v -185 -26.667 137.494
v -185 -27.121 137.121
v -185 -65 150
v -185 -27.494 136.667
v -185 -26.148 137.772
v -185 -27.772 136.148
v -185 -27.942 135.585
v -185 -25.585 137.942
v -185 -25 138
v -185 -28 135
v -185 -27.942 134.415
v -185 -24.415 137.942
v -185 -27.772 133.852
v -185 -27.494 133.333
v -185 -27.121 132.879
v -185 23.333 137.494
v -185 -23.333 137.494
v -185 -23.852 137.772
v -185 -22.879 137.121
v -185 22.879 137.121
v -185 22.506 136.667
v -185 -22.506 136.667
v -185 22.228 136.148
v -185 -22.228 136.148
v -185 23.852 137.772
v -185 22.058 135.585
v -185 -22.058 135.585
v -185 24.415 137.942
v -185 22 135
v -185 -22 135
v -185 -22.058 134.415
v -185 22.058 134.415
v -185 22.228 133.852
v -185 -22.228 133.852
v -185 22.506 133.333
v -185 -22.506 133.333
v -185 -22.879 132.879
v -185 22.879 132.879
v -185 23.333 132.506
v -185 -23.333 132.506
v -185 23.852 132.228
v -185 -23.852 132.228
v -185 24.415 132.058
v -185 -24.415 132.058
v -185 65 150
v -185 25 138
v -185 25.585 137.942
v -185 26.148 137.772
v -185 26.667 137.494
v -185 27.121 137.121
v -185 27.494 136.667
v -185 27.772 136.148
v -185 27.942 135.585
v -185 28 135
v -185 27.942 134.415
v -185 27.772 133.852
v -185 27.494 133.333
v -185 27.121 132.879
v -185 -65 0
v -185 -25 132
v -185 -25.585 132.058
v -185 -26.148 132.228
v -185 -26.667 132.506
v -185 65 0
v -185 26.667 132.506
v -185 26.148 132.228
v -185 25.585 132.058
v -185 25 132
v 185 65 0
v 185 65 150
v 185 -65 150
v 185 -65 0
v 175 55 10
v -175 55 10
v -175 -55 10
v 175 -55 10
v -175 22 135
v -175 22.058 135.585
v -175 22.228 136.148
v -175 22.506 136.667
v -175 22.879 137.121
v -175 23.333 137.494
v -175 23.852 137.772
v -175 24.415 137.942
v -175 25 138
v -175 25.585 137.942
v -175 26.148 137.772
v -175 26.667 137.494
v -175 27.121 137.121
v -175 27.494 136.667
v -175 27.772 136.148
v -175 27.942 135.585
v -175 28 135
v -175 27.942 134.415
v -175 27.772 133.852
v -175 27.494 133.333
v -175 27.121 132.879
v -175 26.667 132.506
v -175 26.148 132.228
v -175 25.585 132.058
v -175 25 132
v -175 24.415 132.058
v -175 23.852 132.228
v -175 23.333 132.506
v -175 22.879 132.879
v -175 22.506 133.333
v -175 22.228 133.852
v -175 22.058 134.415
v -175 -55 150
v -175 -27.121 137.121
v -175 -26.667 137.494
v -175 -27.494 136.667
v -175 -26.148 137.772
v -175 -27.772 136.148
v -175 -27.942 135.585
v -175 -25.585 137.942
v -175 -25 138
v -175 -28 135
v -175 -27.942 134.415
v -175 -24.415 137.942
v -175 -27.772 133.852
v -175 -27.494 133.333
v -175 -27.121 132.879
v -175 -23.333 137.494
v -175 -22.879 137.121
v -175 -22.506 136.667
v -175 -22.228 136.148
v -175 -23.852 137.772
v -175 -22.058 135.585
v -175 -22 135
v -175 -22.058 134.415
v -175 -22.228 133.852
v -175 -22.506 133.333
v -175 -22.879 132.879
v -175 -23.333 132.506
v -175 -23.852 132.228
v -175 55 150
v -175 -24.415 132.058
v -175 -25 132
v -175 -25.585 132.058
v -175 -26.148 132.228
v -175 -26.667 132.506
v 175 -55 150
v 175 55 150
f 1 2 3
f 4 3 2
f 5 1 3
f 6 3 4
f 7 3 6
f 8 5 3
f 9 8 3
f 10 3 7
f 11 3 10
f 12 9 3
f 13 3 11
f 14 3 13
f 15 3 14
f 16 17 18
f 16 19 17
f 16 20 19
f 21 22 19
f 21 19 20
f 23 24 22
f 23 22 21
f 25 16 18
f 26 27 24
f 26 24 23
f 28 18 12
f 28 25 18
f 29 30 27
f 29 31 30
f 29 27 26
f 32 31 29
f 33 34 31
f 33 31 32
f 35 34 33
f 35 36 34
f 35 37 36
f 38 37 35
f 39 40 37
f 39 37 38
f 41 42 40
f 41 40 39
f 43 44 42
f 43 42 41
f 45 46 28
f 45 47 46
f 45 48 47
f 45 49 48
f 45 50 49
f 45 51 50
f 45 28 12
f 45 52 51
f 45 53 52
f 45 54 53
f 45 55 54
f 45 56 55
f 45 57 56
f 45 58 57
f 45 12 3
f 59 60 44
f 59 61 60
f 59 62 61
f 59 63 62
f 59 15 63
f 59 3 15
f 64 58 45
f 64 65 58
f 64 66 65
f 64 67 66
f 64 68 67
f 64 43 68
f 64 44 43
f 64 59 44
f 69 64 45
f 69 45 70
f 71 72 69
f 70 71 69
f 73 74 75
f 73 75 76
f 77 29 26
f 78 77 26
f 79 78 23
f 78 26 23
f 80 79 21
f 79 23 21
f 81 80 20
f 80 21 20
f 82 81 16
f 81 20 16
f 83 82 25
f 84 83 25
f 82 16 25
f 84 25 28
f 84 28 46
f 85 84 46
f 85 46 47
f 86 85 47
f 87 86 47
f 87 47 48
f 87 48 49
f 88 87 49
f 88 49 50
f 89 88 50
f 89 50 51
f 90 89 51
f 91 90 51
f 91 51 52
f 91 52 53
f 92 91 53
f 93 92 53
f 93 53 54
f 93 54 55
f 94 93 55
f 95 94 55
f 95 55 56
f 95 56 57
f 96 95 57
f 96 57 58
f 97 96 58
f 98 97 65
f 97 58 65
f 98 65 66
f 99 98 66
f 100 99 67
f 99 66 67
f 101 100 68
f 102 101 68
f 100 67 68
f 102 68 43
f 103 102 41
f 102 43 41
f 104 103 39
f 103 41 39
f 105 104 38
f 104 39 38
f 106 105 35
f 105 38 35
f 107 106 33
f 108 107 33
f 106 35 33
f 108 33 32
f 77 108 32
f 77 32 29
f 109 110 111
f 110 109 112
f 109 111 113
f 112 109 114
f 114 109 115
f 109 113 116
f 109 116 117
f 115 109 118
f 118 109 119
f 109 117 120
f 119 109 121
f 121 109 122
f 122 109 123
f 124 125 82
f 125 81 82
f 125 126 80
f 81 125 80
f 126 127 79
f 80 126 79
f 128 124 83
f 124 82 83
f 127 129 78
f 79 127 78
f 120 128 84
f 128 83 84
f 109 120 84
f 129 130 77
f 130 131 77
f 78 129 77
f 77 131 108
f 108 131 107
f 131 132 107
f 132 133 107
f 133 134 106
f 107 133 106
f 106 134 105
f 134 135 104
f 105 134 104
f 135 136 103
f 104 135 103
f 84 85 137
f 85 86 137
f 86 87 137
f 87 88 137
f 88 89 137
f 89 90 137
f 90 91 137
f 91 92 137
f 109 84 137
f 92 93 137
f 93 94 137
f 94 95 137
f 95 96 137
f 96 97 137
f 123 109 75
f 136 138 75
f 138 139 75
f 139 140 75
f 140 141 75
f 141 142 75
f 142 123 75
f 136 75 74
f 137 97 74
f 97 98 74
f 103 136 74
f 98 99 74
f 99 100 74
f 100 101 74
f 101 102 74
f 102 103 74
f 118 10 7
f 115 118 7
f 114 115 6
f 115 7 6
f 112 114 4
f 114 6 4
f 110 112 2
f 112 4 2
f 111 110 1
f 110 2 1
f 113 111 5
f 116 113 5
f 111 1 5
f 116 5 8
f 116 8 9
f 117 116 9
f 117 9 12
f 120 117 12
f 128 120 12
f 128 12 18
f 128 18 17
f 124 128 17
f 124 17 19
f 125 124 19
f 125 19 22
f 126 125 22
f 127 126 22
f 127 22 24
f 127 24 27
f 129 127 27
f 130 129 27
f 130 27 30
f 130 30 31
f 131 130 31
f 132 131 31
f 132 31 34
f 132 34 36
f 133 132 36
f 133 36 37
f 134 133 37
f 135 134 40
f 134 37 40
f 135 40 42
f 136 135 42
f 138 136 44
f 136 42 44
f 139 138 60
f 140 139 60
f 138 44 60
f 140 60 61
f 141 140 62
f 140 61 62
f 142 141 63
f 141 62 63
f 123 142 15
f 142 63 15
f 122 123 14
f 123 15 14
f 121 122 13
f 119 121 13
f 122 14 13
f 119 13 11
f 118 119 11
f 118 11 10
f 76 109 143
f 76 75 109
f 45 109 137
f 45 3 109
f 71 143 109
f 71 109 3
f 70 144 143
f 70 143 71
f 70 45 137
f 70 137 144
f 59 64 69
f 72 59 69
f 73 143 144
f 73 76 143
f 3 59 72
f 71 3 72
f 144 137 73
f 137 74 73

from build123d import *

# Parameters (mm, degrees)
F0_W     = 370
F0_H     = 130
F1_DEPTH = 150
F2_T     = -10
F3_R     = 3
F4_DEPTH = 25


with BuildPart() as f1:
    # F0 (on Top) → F1 (new body)
    with BuildSketch(Plane.XY):
        Rectangle(F0_W, F0_H)
    extrude(amount=F1_DEPTH)

    # F2
    f2_openings = [f1.faces().sort_by_distance(p)[0] for p in [
        (0, 0, 150),
    ]]
    offset(amount=F2_T, openings=f2_openings)

    # F3 (on face) → F4 (cut)
    with BuildSketch(Plane(origin=(-185, 0, 0), x_dir=(0, -1, 0), z_dir=(-1, 0, 0))):
        with Locations((-25, 135)):
            Circle(F3_R)
        with Locations((25, 135)):
            Circle(F3_R)
    extrude(amount=-F4_DEPTH, mode=Mode.SUBTRACT)


solid = f1.part
